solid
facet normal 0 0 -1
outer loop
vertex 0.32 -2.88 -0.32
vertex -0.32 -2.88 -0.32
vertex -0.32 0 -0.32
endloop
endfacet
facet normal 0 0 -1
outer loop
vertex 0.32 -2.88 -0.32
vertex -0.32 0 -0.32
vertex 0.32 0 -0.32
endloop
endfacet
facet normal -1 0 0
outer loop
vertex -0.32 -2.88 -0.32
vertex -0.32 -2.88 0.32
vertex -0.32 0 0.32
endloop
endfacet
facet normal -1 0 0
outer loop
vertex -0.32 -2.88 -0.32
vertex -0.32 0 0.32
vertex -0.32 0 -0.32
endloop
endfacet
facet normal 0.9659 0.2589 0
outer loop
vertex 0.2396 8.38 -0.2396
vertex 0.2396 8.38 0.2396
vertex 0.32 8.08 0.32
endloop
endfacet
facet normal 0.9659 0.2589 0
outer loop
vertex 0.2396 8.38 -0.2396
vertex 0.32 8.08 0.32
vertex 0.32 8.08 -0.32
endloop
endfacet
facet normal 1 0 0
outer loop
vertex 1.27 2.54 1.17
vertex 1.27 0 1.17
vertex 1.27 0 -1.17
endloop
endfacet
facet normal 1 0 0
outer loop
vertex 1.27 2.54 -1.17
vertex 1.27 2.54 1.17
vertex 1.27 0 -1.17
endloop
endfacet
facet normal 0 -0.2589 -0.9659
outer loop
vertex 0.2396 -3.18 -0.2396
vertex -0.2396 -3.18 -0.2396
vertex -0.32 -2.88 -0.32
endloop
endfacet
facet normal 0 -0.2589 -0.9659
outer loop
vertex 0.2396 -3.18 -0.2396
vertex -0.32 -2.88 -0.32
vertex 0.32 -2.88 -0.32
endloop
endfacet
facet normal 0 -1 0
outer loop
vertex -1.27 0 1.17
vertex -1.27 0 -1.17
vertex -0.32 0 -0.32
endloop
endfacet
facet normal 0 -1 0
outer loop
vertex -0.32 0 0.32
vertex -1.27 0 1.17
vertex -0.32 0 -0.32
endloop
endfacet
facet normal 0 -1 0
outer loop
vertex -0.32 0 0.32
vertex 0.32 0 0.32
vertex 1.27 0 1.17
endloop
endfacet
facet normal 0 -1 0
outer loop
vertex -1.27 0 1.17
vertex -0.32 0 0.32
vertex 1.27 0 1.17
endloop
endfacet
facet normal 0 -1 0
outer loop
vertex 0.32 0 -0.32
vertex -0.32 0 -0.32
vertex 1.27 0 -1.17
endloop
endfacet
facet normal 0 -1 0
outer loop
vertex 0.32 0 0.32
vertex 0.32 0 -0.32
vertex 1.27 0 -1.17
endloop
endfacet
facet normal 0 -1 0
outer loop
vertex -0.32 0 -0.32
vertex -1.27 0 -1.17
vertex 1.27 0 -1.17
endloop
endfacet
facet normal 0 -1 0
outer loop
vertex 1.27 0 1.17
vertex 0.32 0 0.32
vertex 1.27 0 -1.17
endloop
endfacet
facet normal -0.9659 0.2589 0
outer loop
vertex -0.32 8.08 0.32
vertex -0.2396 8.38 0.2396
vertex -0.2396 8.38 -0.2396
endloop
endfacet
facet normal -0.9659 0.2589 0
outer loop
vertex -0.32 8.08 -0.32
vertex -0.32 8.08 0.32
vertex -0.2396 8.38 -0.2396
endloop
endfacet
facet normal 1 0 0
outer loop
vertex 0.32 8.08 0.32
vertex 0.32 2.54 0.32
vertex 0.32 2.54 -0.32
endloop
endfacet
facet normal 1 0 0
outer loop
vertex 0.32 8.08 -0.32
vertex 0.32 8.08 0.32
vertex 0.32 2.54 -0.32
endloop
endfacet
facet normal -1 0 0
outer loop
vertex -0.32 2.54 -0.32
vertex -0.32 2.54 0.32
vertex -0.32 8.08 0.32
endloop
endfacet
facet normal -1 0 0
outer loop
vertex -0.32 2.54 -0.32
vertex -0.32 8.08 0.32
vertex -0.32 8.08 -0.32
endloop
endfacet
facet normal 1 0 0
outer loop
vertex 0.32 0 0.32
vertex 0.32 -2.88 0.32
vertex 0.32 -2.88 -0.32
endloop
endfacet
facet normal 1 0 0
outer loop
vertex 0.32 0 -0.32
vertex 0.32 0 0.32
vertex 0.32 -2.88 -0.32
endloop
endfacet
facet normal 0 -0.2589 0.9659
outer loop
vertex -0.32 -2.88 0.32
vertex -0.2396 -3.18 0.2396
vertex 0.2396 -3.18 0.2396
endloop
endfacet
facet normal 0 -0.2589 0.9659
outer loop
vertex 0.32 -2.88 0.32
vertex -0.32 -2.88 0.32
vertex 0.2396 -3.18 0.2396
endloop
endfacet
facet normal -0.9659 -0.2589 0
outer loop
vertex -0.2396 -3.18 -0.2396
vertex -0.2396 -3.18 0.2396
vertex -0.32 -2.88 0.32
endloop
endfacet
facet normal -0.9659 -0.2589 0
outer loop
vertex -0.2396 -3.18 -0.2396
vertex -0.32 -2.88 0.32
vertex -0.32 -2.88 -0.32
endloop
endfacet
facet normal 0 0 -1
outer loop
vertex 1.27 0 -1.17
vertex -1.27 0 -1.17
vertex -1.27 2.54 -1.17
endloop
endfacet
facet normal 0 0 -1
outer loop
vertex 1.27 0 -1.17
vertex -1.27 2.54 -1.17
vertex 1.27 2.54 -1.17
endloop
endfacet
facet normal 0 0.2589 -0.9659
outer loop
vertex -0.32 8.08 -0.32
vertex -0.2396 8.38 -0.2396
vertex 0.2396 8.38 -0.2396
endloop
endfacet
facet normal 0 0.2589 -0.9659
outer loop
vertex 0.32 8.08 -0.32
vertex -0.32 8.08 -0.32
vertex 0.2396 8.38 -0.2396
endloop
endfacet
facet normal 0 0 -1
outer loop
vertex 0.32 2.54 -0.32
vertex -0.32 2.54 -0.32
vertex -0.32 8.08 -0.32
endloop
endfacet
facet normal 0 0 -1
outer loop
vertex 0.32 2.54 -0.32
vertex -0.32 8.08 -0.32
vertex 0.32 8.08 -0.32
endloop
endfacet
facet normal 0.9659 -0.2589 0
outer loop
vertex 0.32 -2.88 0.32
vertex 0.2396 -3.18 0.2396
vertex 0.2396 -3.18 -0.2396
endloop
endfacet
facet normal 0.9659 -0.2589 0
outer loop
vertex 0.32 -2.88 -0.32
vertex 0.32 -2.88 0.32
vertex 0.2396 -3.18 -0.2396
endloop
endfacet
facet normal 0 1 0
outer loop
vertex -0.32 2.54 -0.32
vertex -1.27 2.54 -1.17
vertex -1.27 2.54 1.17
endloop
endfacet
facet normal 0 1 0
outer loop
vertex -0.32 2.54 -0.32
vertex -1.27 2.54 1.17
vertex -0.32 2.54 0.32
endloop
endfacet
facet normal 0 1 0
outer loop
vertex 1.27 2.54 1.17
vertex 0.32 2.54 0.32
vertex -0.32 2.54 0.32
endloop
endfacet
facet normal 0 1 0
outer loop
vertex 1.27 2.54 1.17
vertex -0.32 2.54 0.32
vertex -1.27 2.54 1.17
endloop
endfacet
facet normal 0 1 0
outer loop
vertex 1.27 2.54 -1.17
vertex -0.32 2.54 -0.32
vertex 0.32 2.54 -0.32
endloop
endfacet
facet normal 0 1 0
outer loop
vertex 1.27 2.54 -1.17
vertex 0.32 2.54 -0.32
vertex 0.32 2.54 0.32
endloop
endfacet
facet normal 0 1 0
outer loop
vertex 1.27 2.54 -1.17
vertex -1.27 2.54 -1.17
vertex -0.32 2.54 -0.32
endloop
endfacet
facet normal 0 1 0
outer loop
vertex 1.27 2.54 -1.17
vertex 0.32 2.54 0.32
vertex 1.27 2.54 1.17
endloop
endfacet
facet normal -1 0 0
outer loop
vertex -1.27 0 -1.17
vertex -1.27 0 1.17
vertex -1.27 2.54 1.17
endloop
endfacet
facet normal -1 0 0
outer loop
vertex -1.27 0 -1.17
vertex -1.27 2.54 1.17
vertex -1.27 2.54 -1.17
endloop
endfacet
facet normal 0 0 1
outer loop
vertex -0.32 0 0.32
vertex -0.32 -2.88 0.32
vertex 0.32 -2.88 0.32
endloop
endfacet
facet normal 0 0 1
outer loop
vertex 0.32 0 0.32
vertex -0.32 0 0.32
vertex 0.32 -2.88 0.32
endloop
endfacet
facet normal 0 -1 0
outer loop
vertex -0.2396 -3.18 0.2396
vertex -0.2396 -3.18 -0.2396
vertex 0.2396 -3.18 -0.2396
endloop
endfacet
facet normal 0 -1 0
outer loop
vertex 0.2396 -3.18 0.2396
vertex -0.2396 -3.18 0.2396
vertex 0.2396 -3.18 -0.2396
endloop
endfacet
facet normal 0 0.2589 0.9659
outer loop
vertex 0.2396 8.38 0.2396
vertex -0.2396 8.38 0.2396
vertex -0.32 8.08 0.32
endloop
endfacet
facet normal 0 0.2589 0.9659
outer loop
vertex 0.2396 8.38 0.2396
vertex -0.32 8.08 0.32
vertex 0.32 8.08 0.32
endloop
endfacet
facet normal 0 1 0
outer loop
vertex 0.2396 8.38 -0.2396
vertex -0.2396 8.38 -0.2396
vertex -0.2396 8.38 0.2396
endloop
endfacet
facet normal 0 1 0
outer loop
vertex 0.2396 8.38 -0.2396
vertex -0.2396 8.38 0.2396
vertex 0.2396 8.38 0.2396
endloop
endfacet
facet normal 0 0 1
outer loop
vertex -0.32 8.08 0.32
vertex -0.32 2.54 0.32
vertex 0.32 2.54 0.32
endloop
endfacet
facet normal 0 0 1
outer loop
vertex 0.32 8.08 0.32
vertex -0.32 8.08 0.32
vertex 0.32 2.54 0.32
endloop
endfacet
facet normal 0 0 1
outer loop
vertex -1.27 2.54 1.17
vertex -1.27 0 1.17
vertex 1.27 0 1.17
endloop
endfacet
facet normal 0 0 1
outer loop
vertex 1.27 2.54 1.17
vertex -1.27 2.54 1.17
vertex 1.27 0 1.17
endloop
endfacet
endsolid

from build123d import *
from OCP.BRepFilletAPI import BRepFilletAPI_MakeChamfer

# Parameters (mm, degrees)
BOSS_EXTRUDE1_DEPTH      = 8.38
BOSS_EXTRUDE1_DEPTH_BACK = 3.18
SKETCH1_W                = 0.64
SKETCH1_H                = 0.64
SKETCH2_W                = 2.54
SKETCH2_H                = 2.34
BOSS_EXTRUDE2_DEPTH      = 2.54
CHAMFER1_SIZE            = 0.3
CHAMFER1_SIZE2           = 0.080384758


with BuildPart() as part:
    # Sketch1 → Boss-Extrude1 (new, two sides: drawn at the far end of the back side and taken through both)
    with BuildSketch(Plane(origin=(0, 0, 0), x_dir=(1, 0, 0), z_dir=(0, 1, 0)).offset(-BOSS_EXTRUDE1_DEPTH_BACK)):
        Rectangle(SKETCH1_W, SKETCH1_H)
    extrude(amount=BOSS_EXTRUDE1_DEPTH + BOSS_EXTRUDE1_DEPTH_BACK)

    # Sketch2 → Boss-Extrude2 (add)
    with BuildSketch(Plane(origin=(0, 0, 0), x_dir=(1, 0, 0), z_dir=(0, 1, 0))):
        Rectangle(SKETCH2_W, SKETCH2_H)
    extrude(amount=BOSS_EXTRUDE2_DEPTH)

    # Chamfer1: one chamfer whose edges measure the first distance from different faces: ONE call of the kernel's chamfer builder (chamfer() names one face for all edges)
    chamfer1_edges_1 = [part.edges().sort_by_distance(p)[0] for p in [
        (-0.32, 8.38, 0),
    ]]
    chamfer1_side_1 = [part.faces().sort_by_distance(p)[0] for p in [
        (-0.32, 5.46, 0),
    ]]
    chamfer1_edges_2 = [part.edges().sort_by_distance(p)[0] for p in [
        (0.32, -3.18, 0),
    ]]
    chamfer1_side_2 = [part.faces().sort_by_distance(p)[0] for p in [
        (0.32, -1.59, 0),
    ]]
    chamfer1_edges_3 = [part.edges().sort_by_distance(p)[0] for p in [
        (0, -3.18, 0.32),
    ]]
    chamfer1_side_3 = [part.faces().sort_by_distance(p)[0] for p in [
        (0, -1.59, 0.32),
    ]]
    chamfer1_edges_4 = [part.edges().sort_by_distance(p)[0] for p in [
        (-0.32, -3.18, 0),
    ]]
    chamfer1_side_4 = [part.faces().sort_by_distance(p)[0] for p in [
        (-0.32, -1.59, 0),
    ]]
    chamfer1_edges_5 = [part.edges().sort_by_distance(p)[0] for p in [
        (0, -3.18, -0.32),
    ]]
    chamfer1_side_5 = [part.faces().sort_by_distance(p)[0] for p in [
        (0, -1.59, -0.32),
    ]]
    chamfer1_edges_6 = [part.edges().sort_by_distance(p)[0] for p in [
        (0, 8.38, 0.32),
    ]]
    chamfer1_side_6 = [part.faces().sort_by_distance(p)[0] for p in [
        (0, 5.46, 0.32),
    ]]
    chamfer1_edges_7 = [part.edges().sort_by_distance(p)[0] for p in [
        (0.32, 8.38, 0),
    ]]
    chamfer1_side_7 = [part.faces().sort_by_distance(p)[0] for p in [
        (0.32, 5.46, 0),
    ]]
    chamfer1_edges_8 = [part.edges().sort_by_distance(p)[0] for p in [
        (0, 8.38, -0.32),
    ]]
    chamfer1_side_8 = [part.faces().sort_by_distance(p)[0] for p in [
        (0, 5.46, -0.32),
    ]]
    chamfer1 = BRepFilletAPI_MakeChamfer(part.part.solid().wrapped)
    for e in chamfer1_edges_1:
        chamfer1.Add(CHAMFER1_SIZE, CHAMFER1_SIZE2, e.wrapped, chamfer1_side_1[0].wrapped)  # the first distance lies on this face
    for e in chamfer1_edges_2:
        chamfer1.Add(CHAMFER1_SIZE, CHAMFER1_SIZE2, e.wrapped, chamfer1_side_2[0].wrapped)  # the first distance lies on this face
    for e in chamfer1_edges_3:
        chamfer1.Add(CHAMFER1_SIZE, CHAMFER1_SIZE2, e.wrapped, chamfer1_side_3[0].wrapped)  # the first distance lies on this face
    for e in chamfer1_edges_4:
        chamfer1.Add(CHAMFER1_SIZE, CHAMFER1_SIZE2, e.wrapped, chamfer1_side_4[0].wrapped)  # the first distance lies on this face
    for e in chamfer1_edges_5:
        chamfer1.Add(CHAMFER1_SIZE, CHAMFER1_SIZE2, e.wrapped, chamfer1_side_5[0].wrapped)  # the first distance lies on this face
    for e in chamfer1_edges_6:
        chamfer1.Add(CHAMFER1_SIZE, CHAMFER1_SIZE2, e.wrapped, chamfer1_side_6[0].wrapped)  # the first distance lies on this face
    for e in chamfer1_edges_7:
        chamfer1.Add(CHAMFER1_SIZE, CHAMFER1_SIZE2, e.wrapped, chamfer1_side_7[0].wrapped)  # the first distance lies on this face
    for e in chamfer1_edges_8:
        chamfer1.Add(CHAMFER1_SIZE, CHAMFER1_SIZE2, e.wrapped, chamfer1_side_8[0].wrapped)  # the first distance lies on this face
    add(Compound.cast(chamfer1.Shape()), mode=Mode.REPLACE)


solid = part.part
